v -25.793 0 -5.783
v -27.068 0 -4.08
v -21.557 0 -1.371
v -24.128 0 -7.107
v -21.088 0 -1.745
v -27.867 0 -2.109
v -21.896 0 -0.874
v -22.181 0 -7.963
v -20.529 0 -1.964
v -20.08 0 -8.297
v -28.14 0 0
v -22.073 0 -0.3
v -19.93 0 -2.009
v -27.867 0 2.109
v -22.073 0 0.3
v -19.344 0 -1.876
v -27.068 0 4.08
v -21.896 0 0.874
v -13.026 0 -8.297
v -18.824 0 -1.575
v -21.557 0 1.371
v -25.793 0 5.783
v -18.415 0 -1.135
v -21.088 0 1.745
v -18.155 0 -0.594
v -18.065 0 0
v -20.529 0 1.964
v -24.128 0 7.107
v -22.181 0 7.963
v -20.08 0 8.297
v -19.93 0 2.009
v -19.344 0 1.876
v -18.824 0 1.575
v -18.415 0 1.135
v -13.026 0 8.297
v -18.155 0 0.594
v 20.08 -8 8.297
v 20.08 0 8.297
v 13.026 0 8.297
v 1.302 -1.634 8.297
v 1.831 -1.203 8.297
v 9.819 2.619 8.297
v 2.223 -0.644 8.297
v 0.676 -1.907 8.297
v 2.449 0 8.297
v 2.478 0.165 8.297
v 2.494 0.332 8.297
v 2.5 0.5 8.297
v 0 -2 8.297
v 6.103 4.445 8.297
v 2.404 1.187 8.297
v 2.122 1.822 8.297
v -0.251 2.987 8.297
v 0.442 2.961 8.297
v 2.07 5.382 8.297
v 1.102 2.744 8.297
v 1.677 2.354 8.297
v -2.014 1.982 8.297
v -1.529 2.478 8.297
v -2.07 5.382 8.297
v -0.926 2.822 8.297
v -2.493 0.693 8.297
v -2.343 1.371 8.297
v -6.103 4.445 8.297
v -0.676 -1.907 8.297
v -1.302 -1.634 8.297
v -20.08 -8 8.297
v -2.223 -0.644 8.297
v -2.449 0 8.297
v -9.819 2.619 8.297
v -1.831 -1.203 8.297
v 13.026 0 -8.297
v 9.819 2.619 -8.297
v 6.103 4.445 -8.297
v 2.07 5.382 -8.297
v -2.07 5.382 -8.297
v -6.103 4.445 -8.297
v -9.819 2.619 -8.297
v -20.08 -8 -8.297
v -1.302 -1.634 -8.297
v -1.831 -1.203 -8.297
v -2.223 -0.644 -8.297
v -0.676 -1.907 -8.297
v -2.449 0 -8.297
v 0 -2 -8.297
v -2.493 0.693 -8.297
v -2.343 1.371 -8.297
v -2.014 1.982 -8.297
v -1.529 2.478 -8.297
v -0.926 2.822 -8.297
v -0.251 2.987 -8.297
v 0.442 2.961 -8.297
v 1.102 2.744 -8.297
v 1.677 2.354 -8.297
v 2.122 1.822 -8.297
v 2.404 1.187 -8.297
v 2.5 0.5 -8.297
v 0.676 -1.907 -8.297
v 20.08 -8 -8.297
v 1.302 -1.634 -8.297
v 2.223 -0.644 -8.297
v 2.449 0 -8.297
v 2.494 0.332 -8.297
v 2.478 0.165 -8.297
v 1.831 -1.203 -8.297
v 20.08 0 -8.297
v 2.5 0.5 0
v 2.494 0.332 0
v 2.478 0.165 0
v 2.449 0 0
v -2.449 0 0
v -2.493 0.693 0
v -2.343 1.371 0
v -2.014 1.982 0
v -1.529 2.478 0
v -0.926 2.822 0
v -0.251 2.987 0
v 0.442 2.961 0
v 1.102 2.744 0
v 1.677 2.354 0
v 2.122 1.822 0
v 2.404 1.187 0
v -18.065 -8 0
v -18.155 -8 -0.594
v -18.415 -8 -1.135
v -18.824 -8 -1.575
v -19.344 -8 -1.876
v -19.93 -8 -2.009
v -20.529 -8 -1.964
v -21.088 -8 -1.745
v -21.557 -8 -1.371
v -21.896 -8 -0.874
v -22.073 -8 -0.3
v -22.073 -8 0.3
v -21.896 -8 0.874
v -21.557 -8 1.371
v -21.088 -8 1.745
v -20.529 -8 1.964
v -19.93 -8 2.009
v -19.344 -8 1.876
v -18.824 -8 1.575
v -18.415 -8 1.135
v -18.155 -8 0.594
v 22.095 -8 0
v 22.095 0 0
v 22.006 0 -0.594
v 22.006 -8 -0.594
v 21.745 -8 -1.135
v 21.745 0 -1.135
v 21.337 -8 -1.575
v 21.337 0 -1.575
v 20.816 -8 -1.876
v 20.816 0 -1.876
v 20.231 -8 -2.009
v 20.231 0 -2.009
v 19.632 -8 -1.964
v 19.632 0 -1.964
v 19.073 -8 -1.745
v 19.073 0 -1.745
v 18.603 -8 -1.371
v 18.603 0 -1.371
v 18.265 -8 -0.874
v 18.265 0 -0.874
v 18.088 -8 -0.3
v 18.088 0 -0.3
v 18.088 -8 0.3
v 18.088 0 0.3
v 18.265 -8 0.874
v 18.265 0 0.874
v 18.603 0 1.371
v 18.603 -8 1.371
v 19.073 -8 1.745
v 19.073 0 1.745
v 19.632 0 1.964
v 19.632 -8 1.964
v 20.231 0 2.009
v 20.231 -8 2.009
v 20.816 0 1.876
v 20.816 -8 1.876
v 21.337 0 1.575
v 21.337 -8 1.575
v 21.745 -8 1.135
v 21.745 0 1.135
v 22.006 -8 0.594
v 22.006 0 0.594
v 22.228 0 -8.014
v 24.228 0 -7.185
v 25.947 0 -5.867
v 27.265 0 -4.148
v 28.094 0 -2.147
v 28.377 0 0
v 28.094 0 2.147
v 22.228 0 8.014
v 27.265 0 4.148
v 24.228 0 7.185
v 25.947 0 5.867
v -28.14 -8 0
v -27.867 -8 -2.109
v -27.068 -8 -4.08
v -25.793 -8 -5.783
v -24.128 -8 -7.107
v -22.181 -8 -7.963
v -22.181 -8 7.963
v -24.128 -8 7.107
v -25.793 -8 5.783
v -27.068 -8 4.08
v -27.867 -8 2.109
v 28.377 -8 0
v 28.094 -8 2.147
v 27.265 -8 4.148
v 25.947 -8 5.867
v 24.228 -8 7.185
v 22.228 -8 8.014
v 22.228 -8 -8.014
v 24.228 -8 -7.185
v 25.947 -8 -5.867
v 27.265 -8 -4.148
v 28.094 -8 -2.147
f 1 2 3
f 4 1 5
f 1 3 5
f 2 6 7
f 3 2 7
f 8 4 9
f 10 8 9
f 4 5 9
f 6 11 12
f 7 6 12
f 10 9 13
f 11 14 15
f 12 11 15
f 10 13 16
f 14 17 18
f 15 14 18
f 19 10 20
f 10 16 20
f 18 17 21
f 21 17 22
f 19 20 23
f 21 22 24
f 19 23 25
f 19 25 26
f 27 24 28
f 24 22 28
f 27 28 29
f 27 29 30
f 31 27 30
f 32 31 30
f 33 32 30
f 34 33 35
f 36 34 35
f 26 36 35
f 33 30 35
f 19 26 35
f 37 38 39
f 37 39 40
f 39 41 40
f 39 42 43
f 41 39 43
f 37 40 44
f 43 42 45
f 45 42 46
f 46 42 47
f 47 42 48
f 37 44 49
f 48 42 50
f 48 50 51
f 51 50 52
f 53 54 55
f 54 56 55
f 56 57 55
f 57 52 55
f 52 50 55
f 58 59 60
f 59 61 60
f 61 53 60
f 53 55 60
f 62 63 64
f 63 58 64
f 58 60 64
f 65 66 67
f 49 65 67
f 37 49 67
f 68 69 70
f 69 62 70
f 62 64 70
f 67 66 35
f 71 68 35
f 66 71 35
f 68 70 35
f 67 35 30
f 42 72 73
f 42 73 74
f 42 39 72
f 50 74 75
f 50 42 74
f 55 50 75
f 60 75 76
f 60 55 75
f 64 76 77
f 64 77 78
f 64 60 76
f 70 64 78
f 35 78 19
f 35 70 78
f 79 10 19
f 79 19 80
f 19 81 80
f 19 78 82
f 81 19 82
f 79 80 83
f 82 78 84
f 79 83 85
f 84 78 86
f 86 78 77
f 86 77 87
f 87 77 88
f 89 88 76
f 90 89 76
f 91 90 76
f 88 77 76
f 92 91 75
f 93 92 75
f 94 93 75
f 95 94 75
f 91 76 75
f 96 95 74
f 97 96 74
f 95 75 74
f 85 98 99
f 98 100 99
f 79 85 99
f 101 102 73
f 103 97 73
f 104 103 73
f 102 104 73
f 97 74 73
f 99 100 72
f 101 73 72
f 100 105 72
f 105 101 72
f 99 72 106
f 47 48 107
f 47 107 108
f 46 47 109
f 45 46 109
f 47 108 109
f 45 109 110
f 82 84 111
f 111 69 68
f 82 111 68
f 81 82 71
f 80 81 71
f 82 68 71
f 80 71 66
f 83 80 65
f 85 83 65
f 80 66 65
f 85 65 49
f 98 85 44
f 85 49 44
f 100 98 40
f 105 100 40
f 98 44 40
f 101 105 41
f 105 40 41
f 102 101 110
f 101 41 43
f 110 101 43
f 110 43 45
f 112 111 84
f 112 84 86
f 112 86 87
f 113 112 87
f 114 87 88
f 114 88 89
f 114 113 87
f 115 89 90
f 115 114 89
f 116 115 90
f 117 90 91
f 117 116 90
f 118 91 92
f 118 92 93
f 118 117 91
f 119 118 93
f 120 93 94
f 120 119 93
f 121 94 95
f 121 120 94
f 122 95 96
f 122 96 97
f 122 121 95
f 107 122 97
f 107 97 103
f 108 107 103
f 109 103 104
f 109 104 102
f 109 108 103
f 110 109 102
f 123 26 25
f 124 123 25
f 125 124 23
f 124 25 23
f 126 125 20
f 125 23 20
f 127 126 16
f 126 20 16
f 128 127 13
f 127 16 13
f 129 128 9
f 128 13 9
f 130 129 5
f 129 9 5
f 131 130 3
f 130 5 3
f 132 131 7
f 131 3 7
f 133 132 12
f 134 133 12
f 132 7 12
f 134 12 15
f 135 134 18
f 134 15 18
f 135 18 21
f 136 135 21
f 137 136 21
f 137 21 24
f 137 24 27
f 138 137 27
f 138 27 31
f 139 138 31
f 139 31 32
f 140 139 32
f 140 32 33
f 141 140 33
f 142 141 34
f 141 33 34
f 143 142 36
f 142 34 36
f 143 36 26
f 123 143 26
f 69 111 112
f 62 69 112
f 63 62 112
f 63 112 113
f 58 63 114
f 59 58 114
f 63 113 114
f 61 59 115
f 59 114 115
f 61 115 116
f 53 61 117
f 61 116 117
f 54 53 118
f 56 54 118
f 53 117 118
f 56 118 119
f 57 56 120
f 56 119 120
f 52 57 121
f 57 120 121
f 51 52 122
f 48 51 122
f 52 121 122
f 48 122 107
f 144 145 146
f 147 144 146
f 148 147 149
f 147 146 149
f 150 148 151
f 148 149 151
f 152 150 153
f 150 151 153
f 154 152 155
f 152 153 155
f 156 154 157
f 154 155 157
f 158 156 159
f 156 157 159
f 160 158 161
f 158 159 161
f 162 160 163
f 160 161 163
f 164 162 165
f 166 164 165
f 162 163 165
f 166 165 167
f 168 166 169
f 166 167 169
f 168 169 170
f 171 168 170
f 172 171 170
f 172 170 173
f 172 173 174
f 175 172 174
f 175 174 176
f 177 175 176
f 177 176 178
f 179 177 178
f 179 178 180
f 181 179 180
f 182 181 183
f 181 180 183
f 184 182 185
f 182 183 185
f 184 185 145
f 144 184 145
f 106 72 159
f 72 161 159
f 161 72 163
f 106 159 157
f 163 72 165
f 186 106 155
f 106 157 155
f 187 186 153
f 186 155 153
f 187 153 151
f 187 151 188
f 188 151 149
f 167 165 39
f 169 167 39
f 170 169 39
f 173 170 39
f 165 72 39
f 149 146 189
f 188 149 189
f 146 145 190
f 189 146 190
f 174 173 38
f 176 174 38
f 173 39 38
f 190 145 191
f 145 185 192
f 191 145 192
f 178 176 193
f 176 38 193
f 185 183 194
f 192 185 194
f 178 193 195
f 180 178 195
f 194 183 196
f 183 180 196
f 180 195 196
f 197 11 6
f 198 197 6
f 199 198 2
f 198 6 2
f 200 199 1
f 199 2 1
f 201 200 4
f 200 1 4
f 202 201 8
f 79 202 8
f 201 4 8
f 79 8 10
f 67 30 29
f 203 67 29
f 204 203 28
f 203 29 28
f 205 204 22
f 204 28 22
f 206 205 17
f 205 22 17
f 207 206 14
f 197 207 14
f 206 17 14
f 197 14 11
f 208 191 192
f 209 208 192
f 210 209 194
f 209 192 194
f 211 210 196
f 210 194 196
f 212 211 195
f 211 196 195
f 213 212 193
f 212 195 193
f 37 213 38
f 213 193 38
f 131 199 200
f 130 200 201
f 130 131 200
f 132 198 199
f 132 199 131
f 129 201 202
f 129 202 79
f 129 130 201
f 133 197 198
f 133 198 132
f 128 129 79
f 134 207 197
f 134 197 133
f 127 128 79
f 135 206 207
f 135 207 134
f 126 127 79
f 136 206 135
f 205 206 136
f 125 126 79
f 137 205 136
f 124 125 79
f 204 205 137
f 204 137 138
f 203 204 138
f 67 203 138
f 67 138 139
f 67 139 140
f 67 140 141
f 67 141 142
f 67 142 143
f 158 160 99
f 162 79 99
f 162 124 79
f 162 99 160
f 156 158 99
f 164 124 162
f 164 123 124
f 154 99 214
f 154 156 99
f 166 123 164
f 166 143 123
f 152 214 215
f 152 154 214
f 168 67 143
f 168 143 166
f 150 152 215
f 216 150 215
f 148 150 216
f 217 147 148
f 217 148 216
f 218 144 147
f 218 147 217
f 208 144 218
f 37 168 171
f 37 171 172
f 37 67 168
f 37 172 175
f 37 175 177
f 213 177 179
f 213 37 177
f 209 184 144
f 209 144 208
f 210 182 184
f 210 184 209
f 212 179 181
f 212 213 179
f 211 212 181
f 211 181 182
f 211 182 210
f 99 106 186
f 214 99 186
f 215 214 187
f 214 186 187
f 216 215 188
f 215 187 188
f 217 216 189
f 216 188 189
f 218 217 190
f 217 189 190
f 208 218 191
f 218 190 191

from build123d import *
from build123d import SkipClean  # not in build123d's __all__

# Parameters (mm, degrees)
F1_DEPTH      = 8
F3_DEPTH      = 8.2965155193
F3_DEPTH_BACK = 8.2965155193
F4_R          = 2.5
F5_DEPTH      = 12.5


with BuildPart() as f1:
    # F0 (on Front) → F1 (new body)
    with BuildSketch(Plane.XZ):
        with BuildLine():
            Line((20.0802286013, 8.2965155193), (-20.0802286013, 8.2965155193))
            ThreePointArc((-20.0802286013, 8.2965155193), (-25.7931508501, 5.7833391211), (-28.1397494181, 0))
            Line((-28.1397494181, 0), (-22.0952286013, 0))
            ThreePointArc((-22.0952286013, 0), (-20.0802286013, 2.015), (-18.0652286013, 0))
            Line((-18.0652286013, 0), (18.0652286013, 0))
            ThreePointArc((18.0652286013, 0), (20.0802286013, 2.015), (22.0952286013, 0))
            Line((22.0952286013, 0), (28.3767441206, 0))
            ThreePointArc((28.3767441206, 0), (25.9467509852, 5.8665223839), (20.0802286013, 8.2965155193))
        make_face()
        with BuildLine():
            Line((-22.0952286013, 0), (-28.1397494181, 0))
            ThreePointArc((-28.1397494181, 0), (-25.7931508501, -5.7833391211), (-20.0802286013, -8.2965155193))
            Line((-20.0802286013, -8.2965155193), (20.0802286013, -8.2965155193))
            ThreePointArc((20.0802286013, -8.2965155193), (25.9467509852, -5.8665223839), (28.3767441206, 0))
            Line((28.3767441206, 0), (22.0952286013, 0))
            ThreePointArc((22.0952286013, 0), (20.0802286013, -2.015), (18.0652286013, 0))
            Line((18.0652286013, 0), (-18.0652286013, 0))
            ThreePointArc((-18.0652286013, 0), (-20.0802286013, -2.015), (-22.0952286013, 0))
        make_face()
    extrude(amount=F1_DEPTH)

    # F2 (on Top) → F3 (join, two sides)
    with BuildSketch(Plane.XY) as f3_sk:
        with BuildLine():
            Line((2.4494897428, 0), (13.0258305651, 0))
            ThreePointArc((13.0258305651, 0), (0, 5.5), (-13.0258305651, 0))
            Line((-13.0258305651, 0), (-2.4494897428, 0))
            ThreePointArc((-2.4494897428, 0), (-0.251272405, 2.9873403825), (2.5, 0.5))
            ThreePointArc((2.5, 0.5), (2.4873403825, 0.248727595), (2.4494897428, 0))
        make_face()
    extrude(amount=F3_DEPTH)
    extrude(f3_sk.sketch, amount=-F3_DEPTH_BACK)

    # F4 (on Top) → F5 (cut, symmetric)
    with BuildSketch(Plane.XY):
        with Locations((0, 0.5)):
            Circle(F4_R)
    with SkipClean():  # cleaning this boolean's faces spoils the solid; the shape is the same uncleaned
        extrude(amount=F5_DEPTH, both=True, mode=Mode.SUBTRACT)


solid = f1.part
